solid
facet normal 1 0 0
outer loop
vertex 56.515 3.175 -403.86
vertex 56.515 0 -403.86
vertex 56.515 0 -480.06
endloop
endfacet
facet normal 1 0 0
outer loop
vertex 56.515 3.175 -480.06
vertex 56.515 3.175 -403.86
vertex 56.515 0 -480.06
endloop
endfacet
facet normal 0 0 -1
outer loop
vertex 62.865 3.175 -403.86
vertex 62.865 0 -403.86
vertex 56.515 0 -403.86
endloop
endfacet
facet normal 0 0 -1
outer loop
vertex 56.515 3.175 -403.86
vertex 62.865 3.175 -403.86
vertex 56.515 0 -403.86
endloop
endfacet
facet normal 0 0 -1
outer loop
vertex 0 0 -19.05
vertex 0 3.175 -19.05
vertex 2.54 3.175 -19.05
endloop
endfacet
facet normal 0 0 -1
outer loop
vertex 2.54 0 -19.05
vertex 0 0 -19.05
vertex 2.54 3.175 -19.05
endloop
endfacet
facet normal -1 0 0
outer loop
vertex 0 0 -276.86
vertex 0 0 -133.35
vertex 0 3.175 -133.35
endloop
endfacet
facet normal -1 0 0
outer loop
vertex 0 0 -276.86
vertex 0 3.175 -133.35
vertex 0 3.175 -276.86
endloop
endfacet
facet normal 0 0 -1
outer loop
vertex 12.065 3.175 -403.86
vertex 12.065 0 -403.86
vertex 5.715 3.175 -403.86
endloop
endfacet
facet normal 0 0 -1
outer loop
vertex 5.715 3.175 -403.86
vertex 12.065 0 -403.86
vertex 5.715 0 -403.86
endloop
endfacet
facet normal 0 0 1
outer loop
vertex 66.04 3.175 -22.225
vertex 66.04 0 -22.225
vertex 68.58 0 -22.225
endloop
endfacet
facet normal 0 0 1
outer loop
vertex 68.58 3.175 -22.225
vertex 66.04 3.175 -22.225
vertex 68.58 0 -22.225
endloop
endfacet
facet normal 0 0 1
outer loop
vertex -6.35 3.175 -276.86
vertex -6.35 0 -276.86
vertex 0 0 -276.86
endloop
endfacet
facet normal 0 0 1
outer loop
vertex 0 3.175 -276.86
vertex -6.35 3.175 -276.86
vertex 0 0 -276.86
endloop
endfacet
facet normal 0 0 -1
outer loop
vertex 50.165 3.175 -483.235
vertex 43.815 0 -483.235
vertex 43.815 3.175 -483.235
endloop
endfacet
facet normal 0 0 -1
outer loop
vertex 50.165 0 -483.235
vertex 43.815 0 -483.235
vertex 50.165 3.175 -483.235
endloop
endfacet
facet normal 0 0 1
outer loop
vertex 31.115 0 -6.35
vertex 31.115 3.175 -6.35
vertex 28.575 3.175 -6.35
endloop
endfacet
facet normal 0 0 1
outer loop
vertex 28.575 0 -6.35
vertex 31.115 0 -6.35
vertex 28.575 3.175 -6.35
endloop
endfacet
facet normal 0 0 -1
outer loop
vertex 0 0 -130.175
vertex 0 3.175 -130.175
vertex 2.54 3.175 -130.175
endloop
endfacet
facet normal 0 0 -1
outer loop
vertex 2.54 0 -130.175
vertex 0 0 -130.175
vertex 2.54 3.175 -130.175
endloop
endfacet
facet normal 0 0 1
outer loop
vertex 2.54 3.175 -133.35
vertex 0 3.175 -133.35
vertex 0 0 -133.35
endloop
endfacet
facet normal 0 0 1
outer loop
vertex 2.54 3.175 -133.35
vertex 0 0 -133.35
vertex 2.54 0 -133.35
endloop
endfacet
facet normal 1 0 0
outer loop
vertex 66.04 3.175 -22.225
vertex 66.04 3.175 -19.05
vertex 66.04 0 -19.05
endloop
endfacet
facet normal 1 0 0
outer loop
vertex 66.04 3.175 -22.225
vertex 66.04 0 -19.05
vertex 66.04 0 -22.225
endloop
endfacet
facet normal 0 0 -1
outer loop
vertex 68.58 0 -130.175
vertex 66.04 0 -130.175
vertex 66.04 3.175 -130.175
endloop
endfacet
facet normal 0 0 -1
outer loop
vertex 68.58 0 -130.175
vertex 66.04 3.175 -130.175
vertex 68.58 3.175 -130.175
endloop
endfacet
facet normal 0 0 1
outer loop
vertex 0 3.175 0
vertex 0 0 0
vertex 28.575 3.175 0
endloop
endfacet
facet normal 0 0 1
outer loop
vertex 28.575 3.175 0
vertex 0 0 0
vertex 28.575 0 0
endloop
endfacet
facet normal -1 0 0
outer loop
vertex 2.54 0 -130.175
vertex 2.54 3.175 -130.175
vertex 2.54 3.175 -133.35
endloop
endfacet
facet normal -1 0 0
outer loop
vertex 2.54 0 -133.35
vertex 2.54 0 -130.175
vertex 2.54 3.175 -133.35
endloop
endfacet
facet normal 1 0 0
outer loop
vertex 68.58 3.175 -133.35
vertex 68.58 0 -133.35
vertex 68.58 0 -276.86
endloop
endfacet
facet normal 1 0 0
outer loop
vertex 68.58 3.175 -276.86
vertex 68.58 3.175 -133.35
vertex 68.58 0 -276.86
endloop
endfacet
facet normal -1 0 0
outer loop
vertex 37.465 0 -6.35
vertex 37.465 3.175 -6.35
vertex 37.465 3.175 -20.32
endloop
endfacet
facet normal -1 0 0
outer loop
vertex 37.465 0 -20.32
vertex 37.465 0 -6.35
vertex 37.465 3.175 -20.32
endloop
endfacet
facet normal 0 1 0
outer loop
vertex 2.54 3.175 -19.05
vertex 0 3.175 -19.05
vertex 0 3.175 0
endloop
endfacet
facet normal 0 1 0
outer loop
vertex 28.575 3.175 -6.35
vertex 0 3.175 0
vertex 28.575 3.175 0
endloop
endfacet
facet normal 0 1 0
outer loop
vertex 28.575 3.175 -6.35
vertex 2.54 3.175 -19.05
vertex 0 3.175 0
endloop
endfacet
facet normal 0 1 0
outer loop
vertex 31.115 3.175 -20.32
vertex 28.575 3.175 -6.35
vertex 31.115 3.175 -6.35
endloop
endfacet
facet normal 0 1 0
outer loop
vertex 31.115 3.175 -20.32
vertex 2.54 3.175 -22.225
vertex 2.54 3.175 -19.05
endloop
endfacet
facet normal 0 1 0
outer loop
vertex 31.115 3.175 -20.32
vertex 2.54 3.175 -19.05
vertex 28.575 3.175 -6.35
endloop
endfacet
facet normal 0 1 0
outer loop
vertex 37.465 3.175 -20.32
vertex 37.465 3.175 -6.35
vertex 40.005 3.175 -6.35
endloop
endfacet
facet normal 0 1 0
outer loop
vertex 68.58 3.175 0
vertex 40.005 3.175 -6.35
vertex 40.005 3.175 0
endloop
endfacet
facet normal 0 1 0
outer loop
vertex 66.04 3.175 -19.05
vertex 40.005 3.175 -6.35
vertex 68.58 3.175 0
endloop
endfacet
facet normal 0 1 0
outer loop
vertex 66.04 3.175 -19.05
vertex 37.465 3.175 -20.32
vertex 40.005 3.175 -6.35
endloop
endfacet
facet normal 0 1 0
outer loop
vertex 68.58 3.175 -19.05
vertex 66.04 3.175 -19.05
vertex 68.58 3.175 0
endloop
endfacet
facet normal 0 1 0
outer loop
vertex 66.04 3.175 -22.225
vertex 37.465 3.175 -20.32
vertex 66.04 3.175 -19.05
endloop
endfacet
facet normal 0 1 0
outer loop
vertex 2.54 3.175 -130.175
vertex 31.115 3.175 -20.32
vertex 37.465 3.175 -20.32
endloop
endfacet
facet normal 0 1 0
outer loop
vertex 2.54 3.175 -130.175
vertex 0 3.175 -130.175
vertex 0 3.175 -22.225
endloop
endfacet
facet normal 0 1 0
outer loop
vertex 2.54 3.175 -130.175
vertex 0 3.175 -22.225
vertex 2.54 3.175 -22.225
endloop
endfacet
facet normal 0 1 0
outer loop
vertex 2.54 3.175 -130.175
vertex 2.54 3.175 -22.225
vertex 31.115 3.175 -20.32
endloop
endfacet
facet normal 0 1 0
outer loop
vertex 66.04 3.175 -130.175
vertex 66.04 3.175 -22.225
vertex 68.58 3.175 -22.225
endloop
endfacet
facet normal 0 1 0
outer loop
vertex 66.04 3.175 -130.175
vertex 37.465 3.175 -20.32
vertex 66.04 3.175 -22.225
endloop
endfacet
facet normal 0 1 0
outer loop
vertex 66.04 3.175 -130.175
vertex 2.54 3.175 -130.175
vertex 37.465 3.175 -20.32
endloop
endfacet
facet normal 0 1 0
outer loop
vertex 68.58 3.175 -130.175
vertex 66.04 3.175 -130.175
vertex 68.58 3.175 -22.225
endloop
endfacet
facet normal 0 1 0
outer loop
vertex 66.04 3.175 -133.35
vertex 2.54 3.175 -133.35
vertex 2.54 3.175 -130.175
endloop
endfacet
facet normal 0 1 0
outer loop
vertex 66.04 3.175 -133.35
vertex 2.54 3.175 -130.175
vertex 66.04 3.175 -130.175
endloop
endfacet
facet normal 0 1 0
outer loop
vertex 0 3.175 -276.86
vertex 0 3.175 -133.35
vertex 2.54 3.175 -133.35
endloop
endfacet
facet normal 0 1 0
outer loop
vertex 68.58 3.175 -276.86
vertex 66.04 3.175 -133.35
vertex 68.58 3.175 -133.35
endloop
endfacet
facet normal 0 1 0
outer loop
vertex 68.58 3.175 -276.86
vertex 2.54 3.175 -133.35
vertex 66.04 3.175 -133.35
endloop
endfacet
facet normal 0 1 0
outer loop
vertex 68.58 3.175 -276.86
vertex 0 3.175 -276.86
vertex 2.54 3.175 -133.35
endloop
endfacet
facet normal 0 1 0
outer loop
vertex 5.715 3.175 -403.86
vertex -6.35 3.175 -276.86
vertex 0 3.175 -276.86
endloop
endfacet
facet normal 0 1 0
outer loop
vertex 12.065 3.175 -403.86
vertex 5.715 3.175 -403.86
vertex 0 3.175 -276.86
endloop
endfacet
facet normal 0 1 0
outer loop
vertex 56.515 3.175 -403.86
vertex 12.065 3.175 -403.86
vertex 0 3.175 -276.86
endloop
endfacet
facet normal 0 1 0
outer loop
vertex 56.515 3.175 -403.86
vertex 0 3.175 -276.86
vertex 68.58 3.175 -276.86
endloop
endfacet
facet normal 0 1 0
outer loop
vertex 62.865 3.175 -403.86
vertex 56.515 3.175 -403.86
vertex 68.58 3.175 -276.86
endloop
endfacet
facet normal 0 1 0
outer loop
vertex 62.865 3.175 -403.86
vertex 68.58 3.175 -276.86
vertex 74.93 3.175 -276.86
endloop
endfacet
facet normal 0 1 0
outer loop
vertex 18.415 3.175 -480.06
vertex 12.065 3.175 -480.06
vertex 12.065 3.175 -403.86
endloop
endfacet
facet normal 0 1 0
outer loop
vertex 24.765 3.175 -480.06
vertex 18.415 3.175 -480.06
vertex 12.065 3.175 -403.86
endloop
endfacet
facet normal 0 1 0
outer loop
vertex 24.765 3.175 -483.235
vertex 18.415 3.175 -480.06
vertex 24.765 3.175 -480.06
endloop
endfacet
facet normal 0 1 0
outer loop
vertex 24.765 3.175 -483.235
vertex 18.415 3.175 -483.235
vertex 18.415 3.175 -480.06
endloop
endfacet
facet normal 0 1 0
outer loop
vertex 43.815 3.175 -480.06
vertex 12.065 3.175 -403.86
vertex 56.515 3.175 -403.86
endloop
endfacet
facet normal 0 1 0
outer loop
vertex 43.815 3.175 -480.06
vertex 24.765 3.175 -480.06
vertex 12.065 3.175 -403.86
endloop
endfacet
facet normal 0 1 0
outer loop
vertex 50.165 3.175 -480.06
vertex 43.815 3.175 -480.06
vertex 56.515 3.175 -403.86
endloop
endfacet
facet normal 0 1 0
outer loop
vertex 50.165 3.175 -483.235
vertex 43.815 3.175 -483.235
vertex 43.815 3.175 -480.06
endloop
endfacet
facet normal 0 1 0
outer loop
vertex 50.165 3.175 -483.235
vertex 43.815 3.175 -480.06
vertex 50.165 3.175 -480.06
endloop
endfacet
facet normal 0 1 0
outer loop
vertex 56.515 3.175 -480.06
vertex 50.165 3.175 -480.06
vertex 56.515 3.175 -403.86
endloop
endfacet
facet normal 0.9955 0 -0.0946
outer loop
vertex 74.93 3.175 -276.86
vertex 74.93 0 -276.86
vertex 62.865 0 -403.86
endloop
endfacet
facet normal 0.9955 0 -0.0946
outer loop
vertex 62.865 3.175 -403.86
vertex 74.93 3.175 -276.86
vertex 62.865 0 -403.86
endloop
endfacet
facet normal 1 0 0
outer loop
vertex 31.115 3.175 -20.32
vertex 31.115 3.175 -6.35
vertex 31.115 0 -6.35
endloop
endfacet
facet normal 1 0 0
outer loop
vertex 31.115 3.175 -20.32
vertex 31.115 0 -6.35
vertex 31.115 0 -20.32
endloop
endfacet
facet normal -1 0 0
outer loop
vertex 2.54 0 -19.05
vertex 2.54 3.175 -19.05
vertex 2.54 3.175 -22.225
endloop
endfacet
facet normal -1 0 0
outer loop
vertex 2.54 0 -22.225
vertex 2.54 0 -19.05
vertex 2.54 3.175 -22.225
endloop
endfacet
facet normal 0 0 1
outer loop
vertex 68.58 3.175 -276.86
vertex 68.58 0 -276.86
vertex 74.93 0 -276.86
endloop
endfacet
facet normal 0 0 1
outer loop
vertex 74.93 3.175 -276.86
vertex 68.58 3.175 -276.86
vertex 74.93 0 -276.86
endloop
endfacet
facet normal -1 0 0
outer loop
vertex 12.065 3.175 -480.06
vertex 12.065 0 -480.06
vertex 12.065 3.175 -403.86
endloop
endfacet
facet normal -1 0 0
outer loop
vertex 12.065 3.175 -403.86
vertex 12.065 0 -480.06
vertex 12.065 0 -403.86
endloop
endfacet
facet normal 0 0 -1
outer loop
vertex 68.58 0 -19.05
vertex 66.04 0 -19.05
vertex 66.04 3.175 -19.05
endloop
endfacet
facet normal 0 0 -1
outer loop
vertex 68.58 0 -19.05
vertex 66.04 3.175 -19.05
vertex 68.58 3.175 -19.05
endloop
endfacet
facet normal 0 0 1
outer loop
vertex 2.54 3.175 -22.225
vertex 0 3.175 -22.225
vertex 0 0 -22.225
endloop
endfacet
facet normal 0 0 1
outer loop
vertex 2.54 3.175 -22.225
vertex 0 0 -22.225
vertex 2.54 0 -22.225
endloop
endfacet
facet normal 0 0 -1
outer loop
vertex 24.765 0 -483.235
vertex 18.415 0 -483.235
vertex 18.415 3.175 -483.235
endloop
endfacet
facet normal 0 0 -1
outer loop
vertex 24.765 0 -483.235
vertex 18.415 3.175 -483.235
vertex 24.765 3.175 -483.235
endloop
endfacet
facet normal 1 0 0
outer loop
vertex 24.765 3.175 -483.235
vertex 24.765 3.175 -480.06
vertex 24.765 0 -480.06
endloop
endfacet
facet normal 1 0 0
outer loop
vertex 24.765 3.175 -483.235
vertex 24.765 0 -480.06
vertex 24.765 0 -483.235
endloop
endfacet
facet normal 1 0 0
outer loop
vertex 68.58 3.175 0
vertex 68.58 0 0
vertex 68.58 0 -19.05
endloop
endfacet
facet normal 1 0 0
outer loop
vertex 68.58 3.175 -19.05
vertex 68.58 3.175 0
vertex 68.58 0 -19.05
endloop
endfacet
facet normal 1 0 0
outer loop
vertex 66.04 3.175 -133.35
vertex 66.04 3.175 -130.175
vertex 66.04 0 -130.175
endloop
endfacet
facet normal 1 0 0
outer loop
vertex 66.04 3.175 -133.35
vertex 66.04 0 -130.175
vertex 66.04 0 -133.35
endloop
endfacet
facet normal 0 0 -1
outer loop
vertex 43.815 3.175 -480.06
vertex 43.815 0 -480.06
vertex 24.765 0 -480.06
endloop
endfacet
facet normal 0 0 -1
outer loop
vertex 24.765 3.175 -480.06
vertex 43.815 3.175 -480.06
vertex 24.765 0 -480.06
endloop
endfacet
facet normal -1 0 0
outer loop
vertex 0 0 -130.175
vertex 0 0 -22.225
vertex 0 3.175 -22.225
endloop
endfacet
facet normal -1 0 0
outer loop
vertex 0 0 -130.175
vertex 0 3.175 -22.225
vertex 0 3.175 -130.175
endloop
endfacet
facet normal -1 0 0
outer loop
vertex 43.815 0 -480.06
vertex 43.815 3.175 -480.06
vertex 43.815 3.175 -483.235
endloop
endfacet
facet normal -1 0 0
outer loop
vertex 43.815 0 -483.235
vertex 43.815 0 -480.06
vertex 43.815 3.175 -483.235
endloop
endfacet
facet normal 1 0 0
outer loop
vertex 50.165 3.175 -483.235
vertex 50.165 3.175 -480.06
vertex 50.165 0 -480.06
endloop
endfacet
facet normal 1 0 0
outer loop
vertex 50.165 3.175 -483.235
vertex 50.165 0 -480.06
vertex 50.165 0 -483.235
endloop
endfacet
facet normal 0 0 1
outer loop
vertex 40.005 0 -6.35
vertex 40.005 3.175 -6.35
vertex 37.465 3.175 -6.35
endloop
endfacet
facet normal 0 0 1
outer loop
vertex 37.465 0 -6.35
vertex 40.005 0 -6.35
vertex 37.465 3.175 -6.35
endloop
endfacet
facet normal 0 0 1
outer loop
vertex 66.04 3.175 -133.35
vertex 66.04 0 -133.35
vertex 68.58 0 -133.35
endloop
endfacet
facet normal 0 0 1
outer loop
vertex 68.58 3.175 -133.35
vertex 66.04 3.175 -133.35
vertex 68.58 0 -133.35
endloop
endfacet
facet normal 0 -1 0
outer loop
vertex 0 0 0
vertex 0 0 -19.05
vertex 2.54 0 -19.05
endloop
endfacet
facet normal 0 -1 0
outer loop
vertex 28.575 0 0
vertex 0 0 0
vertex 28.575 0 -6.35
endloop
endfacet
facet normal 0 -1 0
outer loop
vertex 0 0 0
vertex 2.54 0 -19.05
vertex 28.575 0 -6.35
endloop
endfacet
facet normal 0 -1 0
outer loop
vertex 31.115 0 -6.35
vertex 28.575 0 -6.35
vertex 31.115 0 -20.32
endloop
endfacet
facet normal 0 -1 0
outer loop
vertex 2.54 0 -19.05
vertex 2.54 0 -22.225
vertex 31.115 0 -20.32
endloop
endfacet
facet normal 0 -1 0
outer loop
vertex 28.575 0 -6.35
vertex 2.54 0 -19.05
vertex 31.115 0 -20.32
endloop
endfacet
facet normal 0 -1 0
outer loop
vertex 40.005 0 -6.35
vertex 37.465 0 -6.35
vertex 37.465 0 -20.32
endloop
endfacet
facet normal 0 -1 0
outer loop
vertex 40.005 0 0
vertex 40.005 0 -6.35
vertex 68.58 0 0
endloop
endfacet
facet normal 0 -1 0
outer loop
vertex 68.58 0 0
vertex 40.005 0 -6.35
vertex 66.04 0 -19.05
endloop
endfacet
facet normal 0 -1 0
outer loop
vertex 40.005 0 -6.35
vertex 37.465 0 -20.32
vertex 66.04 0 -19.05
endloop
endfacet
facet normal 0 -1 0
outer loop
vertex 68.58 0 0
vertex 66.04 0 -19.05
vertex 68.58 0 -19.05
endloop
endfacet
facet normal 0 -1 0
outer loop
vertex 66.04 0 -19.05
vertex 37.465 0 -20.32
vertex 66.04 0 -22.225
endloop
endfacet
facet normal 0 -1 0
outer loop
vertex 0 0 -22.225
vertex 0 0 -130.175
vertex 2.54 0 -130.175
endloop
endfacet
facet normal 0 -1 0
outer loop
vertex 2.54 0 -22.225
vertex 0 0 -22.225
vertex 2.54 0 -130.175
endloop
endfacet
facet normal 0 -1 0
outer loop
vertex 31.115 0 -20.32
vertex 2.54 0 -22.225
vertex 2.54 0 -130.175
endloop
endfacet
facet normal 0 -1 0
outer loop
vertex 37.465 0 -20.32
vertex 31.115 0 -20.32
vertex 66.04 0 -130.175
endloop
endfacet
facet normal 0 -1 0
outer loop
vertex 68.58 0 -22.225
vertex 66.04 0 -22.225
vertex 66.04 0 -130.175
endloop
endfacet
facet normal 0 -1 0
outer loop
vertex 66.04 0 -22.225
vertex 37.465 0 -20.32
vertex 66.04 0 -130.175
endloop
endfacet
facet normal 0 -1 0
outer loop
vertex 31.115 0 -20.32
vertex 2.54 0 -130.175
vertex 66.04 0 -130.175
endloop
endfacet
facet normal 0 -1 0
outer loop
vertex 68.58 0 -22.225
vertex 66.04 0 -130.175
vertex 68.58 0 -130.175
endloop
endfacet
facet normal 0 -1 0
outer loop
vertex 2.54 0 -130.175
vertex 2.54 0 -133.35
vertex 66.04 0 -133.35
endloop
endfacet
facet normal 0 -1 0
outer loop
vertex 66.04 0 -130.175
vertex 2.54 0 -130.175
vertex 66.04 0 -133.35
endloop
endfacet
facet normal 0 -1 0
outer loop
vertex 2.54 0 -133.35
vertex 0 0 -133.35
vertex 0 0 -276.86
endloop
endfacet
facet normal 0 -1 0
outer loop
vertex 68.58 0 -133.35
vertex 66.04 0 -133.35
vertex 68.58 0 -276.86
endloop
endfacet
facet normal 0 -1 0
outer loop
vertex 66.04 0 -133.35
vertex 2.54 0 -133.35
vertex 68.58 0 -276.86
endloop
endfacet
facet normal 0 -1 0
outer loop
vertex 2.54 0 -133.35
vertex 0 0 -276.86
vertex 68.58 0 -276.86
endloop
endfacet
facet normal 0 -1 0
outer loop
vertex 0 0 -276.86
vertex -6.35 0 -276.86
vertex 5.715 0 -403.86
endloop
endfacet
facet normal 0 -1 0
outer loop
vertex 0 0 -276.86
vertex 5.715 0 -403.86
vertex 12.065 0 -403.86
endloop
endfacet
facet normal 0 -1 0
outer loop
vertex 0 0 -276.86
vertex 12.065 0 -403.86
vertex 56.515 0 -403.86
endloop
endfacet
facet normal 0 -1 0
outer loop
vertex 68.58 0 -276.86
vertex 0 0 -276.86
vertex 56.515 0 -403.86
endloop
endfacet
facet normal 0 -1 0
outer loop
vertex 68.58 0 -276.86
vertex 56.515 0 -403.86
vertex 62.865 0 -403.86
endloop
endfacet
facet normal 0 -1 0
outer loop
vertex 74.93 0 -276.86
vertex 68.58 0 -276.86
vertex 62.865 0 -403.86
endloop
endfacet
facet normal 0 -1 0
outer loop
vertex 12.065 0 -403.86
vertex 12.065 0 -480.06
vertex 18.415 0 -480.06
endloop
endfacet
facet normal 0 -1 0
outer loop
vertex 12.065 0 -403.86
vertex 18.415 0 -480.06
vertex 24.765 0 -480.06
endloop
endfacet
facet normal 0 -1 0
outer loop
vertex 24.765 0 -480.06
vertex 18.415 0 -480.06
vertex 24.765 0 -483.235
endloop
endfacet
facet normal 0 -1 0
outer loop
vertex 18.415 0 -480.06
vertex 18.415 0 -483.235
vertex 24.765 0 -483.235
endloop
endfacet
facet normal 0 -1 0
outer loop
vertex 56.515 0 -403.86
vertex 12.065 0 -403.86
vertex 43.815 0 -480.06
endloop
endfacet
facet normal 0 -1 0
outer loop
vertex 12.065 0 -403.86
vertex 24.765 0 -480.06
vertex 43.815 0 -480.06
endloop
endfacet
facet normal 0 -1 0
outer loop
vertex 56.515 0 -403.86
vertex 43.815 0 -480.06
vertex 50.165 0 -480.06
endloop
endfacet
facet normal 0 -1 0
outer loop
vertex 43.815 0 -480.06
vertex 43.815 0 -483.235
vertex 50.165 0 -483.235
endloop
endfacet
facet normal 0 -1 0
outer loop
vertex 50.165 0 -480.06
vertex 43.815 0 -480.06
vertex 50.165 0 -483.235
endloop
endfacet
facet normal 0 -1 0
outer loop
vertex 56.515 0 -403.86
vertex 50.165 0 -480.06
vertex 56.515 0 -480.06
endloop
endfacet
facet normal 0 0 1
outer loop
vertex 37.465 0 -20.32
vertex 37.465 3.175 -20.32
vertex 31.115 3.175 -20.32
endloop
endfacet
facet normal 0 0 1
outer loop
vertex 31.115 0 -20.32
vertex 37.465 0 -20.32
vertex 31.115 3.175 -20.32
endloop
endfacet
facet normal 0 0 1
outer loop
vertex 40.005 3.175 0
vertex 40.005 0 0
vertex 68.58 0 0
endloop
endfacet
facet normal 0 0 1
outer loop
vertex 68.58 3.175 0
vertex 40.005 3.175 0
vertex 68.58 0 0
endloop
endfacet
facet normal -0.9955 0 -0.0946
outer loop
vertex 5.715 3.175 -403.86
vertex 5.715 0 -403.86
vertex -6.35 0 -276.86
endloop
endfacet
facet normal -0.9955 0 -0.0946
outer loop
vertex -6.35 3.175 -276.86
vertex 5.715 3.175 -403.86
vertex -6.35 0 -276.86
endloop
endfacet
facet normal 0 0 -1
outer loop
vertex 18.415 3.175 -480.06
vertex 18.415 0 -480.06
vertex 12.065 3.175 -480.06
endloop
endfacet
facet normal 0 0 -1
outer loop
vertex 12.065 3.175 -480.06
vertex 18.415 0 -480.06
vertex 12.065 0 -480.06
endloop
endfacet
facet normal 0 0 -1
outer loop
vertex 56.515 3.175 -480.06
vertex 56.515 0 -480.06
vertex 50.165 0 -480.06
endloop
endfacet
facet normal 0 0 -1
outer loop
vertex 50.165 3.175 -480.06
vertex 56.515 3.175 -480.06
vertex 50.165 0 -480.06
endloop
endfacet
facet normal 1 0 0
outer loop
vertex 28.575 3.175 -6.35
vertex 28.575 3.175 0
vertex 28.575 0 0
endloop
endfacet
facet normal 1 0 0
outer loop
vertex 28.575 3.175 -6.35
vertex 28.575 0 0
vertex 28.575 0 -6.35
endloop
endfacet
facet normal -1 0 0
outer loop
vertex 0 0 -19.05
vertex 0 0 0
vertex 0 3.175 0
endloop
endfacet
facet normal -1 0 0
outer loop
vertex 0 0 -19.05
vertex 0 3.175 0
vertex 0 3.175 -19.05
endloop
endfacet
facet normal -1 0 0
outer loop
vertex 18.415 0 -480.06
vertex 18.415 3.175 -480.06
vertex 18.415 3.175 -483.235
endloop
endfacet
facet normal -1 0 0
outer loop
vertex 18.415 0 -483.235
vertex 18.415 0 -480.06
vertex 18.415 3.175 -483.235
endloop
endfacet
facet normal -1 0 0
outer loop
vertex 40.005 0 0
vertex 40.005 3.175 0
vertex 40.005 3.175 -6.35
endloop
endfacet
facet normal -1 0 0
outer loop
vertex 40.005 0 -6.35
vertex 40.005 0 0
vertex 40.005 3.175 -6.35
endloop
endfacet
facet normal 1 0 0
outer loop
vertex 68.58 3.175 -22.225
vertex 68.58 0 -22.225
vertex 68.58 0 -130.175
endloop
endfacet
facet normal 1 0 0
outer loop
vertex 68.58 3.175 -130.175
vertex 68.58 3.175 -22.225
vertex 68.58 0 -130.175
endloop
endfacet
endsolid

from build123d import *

# Parameters (mm, degrees)
SKETCH1_W           = 34.29
SKETCH1_H           = 276.86
SKETCH1_W_2         = 6.35
SKETCH1_H_2         = 3.175
BOSS_EXTRUDE1_DEPTH = 3.175
SKETCH3_W           = 2.54
SKETCH3_H           = 3.175
CUT_EXTRUDE1_DEPTH  = 490.020092379
SKETCH4_W           = 2.54
SKETCH4_H           = 6.35
SKETCH4_W_2         = 3.175
SKETCH4_H_2         = 13.97
CUT_EXTRUDE2_DEPTH  = 490.020092379


with BuildPart() as part:
    # Sketch1 → Boss-Extrude1 (new body)
    with BuildSketch(Plane(origin=(0, 0, 0), x_dir=(1, 0, 0), z_dir=(0, 1, 0))):
        with Locations((17.145, 138.43)):
            Rectangle(SKETCH1_W, SKETCH1_H)
        with Locations((51.435, 138.43)):
            Rectangle(SKETCH1_W, SKETCH1_H)
        Polygon((34.29, 403.86), (34.29, 276.86), (68.58, 276.86), (74.93, 276.86), (62.865, 403.86), (56.515, 403.86), align=None)
        Polygon((-6.35, 276.86), (0, 276.86), (34.29, 276.86), (34.29, 403.86), (12.065, 403.86), (5.715, 403.86), align=None)
        Polygon((12.065, 403.86), (34.29, 403.86), (56.515, 403.86), (56.515, 480.06), (50.165, 480.06), (43.815, 480.06), (24.765, 480.06), (18.415, 480.06), (12.065, 480.06), align=None)
        with Locations((21.59, 481.6475)):
            Rectangle(SKETCH1_W_2, SKETCH1_H_2)
        with Locations((46.99, 481.6475)):
            Rectangle(SKETCH1_W_2, SKETCH1_H_2)
    extrude(amount=BOSS_EXTRUDE1_DEPTH)

    # Sketch3 → Cut-Extrude1 (cut, through all)
    with BuildSketch(Plane(origin=(0, 3.175, 0), x_dir=(1, 0, 0), z_dir=(0, 1, 0))):
        with Locations((1.27, 20.6375)):
            Rectangle(SKETCH3_W, SKETCH3_H)
        with Locations((67.31, 20.6375)):
            Rectangle(SKETCH3_W, SKETCH3_H)
        with Locations((1.27, 131.7625)):
            Rectangle(SKETCH3_W, SKETCH3_H)
        with Locations((67.31, 131.7625)):
            Rectangle(SKETCH3_W, SKETCH3_H)
    extrude(amount=-CUT_EXTRUDE1_DEPTH, mode=Mode.SUBTRACT)

    # Sketch4 → Cut-Extrude2 (cut, through all)
    with BuildSketch(Plane(origin=(0, 3.175, 0), x_dir=(1, 0, 0), z_dir=(0, 1, 0))):
        with Locations((29.845, 3.175)):
            Rectangle(SKETCH4_W, SKETCH4_H)
        with Locations((32.7025, 3.175)):
            Rectangle(SKETCH4_W_2, SKETCH4_H)
        with Locations((35.8775, 3.175)):
            Rectangle(SKETCH4_W_2, SKETCH4_H)
        with Locations((38.735, 3.175)):
            Rectangle(SKETCH4_W, SKETCH4_H)
        with Locations((35.8775, 13.335)):
            Rectangle(SKETCH4_W_2, SKETCH4_H_2)
        with Locations((32.7025, 13.335)):
            Rectangle(SKETCH4_W_2, SKETCH4_H_2)
    extrude(amount=-CUT_EXTRUDE2_DEPTH, mode=Mode.SUBTRACT)


solid = part.part
